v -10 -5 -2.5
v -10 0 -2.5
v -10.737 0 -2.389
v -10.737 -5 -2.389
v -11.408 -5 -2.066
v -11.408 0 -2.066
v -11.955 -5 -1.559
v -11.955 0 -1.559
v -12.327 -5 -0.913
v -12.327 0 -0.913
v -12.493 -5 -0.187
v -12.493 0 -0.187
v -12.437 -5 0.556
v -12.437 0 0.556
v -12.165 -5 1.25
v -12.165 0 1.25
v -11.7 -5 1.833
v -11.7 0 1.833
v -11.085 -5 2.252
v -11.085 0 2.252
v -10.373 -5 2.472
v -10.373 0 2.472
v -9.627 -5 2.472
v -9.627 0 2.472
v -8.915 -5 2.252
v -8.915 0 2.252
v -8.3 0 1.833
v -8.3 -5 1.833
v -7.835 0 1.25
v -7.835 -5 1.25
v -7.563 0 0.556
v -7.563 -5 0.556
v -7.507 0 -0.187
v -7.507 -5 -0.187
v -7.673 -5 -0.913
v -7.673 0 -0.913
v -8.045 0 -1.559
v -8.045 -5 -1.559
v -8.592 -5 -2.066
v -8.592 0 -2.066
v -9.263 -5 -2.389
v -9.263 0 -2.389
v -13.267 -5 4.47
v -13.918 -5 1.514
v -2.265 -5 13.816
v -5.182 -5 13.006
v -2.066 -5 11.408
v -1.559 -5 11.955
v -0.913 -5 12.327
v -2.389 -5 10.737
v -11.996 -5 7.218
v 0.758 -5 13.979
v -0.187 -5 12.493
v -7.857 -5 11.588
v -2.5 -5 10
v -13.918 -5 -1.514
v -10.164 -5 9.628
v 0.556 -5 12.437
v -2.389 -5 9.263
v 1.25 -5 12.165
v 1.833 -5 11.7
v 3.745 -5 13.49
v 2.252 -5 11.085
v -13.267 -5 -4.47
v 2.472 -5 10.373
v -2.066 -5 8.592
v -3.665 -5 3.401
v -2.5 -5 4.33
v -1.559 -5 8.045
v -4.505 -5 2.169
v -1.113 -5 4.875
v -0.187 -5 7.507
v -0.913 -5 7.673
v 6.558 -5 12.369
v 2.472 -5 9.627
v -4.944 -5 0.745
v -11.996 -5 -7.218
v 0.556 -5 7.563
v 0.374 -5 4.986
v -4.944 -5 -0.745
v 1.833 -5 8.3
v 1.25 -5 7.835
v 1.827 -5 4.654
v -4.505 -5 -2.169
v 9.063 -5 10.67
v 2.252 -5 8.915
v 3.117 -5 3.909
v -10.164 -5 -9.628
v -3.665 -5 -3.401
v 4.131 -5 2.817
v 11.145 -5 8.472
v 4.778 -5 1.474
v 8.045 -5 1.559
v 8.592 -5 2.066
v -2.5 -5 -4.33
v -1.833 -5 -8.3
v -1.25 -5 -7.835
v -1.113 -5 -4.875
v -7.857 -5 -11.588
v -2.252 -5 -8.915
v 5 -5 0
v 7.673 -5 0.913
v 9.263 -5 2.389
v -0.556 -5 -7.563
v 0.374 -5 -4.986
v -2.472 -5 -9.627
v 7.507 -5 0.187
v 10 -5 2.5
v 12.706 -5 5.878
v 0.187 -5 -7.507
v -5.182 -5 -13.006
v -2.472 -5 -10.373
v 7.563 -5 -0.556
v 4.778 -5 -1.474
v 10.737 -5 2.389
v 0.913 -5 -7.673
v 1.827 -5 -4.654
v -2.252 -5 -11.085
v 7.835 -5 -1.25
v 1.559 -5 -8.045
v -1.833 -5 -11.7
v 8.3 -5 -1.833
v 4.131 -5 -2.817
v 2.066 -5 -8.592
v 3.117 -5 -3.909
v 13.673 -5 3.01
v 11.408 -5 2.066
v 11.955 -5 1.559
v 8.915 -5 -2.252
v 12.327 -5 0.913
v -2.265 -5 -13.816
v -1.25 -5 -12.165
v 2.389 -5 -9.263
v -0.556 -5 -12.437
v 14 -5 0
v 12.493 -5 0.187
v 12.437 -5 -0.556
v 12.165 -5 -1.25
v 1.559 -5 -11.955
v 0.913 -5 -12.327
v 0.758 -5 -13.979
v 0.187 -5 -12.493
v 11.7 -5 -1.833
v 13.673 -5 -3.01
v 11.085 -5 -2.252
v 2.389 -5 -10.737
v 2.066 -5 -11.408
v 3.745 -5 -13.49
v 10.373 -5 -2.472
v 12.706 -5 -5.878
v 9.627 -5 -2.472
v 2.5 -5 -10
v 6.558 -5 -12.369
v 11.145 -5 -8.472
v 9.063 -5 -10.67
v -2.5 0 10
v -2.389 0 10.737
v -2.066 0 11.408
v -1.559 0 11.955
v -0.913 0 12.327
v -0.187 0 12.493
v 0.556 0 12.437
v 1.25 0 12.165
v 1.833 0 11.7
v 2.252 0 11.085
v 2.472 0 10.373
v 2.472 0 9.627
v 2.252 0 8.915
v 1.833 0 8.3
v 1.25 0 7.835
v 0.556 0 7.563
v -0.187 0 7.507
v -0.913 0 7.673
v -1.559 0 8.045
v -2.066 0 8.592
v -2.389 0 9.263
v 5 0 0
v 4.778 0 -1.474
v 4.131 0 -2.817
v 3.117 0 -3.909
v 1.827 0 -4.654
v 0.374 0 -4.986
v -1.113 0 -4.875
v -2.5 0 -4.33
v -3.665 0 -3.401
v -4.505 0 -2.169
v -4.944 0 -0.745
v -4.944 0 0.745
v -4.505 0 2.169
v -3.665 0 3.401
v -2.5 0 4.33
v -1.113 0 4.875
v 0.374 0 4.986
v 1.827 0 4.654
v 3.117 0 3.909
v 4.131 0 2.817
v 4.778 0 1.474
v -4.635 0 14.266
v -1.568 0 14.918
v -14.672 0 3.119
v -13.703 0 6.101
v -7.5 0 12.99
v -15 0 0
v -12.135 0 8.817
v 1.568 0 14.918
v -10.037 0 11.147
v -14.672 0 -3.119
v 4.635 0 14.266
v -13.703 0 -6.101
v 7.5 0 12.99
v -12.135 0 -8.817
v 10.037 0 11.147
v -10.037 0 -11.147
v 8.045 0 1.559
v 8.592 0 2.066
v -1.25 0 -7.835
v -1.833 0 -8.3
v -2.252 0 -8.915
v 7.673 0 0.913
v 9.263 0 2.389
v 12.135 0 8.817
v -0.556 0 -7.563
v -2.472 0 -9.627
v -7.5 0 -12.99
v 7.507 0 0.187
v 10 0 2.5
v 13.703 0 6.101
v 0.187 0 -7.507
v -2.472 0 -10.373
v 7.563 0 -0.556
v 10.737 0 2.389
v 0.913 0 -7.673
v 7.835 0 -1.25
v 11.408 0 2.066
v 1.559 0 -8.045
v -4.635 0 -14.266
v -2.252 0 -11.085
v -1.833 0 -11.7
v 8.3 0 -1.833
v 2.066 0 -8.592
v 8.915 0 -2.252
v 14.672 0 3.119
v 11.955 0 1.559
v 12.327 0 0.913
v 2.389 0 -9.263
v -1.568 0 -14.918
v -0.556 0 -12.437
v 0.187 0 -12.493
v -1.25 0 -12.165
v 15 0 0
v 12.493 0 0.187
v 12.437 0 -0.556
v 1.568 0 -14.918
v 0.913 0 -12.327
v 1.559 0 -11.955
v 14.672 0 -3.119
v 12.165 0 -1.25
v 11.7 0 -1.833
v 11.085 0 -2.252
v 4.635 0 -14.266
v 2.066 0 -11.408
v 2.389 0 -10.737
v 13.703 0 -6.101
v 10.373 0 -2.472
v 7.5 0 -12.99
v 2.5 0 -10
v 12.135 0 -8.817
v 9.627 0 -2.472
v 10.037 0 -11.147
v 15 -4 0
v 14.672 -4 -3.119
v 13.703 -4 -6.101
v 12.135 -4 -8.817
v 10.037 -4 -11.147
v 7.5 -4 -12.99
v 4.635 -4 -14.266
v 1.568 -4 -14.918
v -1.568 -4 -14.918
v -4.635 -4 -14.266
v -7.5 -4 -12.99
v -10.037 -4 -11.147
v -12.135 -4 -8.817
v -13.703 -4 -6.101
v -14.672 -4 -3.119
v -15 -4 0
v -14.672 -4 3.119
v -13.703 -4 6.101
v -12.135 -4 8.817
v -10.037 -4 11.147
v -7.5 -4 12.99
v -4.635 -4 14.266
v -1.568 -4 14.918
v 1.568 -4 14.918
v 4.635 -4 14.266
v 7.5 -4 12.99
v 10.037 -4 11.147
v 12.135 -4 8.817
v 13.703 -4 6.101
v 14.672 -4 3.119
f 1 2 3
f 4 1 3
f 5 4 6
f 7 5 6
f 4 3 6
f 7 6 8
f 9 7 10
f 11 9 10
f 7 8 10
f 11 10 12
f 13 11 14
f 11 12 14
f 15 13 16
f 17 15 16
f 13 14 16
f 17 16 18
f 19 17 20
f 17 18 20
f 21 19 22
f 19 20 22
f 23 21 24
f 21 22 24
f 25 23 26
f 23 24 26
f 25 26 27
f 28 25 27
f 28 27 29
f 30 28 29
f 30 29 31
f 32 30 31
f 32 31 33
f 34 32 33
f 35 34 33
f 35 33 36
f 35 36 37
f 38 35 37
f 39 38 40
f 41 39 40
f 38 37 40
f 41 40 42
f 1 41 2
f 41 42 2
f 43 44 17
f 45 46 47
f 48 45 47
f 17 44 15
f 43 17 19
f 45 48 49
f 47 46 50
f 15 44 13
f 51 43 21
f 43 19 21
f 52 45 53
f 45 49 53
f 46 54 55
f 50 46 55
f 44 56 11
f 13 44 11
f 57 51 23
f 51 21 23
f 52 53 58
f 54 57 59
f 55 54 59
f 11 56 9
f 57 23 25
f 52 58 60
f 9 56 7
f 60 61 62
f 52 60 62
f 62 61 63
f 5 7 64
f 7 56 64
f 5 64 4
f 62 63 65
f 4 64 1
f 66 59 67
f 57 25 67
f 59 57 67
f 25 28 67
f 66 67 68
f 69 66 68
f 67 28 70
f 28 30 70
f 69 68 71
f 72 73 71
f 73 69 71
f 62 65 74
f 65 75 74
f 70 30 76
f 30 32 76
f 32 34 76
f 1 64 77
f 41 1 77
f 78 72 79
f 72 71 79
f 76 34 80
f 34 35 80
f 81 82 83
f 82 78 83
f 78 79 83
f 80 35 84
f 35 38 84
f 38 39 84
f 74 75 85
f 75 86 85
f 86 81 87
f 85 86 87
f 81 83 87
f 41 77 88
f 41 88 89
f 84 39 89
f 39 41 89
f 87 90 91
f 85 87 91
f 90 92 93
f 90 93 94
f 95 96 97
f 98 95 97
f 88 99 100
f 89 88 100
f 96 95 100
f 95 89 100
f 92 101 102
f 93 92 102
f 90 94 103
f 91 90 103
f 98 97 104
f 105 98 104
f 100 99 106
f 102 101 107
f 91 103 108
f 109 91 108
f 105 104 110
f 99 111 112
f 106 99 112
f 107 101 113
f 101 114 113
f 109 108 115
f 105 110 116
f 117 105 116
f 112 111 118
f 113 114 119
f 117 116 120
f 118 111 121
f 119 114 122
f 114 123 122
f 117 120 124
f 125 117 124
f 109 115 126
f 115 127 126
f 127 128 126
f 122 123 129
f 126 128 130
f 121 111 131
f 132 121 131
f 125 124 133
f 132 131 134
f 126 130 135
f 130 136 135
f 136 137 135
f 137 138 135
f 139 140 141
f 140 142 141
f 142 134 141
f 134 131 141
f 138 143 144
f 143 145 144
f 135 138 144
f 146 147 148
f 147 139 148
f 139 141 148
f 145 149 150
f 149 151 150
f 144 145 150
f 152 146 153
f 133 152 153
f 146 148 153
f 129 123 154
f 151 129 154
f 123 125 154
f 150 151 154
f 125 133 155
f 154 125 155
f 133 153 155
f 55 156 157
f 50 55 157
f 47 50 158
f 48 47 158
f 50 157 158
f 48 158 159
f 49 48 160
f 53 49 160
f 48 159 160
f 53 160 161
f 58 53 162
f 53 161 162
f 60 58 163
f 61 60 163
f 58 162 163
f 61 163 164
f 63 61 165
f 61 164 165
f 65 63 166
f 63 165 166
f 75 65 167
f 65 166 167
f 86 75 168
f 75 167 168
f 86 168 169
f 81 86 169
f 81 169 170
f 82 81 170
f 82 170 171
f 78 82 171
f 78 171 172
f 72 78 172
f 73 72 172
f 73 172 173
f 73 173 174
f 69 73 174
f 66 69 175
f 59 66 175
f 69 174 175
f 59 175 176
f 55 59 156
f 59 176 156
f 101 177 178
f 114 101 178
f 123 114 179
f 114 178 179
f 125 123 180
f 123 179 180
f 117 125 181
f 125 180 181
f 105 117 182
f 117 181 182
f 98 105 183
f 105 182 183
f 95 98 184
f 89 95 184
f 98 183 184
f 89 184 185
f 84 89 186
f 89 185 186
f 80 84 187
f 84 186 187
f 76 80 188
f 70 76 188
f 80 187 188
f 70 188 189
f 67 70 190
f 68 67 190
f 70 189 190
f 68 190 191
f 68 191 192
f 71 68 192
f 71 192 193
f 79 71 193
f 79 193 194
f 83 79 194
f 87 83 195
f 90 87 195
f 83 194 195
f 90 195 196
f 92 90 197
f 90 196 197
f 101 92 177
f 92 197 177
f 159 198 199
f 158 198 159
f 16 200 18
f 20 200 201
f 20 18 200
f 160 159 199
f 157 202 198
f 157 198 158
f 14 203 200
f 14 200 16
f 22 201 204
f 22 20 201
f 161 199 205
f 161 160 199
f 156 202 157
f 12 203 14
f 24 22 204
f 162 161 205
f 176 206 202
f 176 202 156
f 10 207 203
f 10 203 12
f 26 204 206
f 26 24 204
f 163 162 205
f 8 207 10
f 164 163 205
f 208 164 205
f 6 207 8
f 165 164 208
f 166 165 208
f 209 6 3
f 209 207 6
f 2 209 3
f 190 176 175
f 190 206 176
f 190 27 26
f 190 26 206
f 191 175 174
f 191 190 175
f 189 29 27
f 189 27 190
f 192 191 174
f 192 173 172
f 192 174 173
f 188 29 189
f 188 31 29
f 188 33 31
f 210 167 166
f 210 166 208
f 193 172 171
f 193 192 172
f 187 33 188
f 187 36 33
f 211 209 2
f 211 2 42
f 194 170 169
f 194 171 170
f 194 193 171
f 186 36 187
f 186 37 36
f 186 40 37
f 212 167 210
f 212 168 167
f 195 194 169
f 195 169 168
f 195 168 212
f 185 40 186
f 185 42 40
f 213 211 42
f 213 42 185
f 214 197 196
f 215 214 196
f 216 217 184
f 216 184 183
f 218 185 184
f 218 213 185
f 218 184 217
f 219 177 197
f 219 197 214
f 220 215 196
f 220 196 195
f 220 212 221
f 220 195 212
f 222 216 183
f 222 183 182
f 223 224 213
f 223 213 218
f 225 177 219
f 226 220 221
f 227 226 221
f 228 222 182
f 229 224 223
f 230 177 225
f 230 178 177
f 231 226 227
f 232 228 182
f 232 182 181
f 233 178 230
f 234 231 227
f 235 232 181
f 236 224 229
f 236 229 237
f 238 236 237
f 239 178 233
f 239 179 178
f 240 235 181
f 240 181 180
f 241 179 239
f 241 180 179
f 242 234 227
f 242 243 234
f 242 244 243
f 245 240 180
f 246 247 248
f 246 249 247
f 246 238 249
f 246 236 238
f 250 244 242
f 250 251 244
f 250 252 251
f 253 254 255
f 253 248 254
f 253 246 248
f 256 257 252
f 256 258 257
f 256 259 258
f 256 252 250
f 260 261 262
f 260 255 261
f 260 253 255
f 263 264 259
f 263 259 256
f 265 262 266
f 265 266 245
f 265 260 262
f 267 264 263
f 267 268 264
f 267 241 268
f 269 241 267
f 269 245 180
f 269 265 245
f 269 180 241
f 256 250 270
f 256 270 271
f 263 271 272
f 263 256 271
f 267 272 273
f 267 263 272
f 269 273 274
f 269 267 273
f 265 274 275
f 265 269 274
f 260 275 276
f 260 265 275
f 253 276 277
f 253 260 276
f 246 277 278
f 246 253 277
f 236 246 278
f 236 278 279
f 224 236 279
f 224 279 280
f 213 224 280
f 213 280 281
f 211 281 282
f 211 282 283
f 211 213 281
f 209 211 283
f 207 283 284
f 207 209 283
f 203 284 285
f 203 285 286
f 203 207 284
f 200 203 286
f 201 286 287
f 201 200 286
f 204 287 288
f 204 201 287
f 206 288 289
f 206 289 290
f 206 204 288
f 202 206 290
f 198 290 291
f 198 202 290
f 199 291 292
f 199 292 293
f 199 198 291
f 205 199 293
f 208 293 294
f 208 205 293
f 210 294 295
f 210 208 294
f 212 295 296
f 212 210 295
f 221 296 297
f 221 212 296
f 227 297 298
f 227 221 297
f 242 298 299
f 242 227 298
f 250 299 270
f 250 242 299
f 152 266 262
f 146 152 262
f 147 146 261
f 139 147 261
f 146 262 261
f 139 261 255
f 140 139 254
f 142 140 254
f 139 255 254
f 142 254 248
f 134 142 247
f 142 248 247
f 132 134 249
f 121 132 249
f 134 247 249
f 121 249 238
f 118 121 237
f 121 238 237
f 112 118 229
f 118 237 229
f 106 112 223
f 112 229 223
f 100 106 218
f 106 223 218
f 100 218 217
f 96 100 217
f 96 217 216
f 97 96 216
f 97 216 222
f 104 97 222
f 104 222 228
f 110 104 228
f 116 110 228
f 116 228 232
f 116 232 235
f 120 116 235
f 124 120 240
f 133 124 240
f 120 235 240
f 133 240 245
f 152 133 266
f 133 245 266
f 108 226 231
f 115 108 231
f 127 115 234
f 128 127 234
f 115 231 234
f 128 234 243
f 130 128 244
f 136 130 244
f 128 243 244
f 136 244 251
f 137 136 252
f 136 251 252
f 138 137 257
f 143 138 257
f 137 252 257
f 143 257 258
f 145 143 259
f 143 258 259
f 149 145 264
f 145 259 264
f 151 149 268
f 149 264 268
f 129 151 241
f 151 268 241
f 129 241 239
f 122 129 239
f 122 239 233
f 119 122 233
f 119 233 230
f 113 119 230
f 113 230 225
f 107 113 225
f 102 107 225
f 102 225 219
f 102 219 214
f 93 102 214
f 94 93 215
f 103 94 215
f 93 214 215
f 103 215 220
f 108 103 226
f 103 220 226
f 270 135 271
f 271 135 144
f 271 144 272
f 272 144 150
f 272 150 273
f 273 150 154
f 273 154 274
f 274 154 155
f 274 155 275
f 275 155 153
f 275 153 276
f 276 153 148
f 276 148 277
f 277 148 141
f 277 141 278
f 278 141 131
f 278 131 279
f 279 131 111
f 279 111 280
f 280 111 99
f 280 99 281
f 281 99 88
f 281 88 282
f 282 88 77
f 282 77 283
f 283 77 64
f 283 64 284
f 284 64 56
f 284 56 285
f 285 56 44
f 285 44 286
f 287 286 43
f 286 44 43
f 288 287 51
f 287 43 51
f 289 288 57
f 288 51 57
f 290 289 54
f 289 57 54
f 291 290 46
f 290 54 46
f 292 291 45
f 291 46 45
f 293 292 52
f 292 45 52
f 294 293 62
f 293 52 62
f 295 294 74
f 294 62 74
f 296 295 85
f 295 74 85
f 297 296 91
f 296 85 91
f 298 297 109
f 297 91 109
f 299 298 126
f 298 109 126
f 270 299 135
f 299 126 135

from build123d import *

# Parameters (mm, degrees)
SKETCH1_R           = 15
SKETCH1_R_2         = 5
BOSS_EXTRUDE1_DEPTH = 5
SKETCH1_3_R         = 2.5
CUT_EXTRUDE1_DEPTH  = 5
CIRPATTERN1_COUNT   = 4
CHAMFER1_SIZE       = 1


with BuildPart() as part:
    # Sketch1 → Boss-Extrude1 (new body)
    with BuildSketch(Plane(origin=(0, 0, 0), x_dir=(1, 0, 0), z_dir=(0, 1, 0))):
        Circle(SKETCH1_R)
        Circle(SKETCH1_R_2, mode=Mode.SUBTRACT)
    extrude(amount=-BOSS_EXTRUDE1_DEPTH)

    # Sketch1<3> → Cut-Extrude1 (cut)
    with BuildSketch(Plane(origin=(0, 0, 0), x_dir=(1, 0, 0), z_dir=(0, 1, 0))):
        with Locations((0, 10)):
            Circle(SKETCH1_3_R)
    cut_extrude1 = extrude(amount=-CUT_EXTRUDE1_DEPTH, mode=Mode.SUBTRACT)

    # CirPattern1: Cut-Extrude1 ×4 about axis
    cirpattern1_axis = Axis((0, -5, 0), (0, 1, 0))
    for i in range(1, CIRPATTERN1_COUNT):
        add(cut_extrude1.rotate(cirpattern1_axis, i * 360 / CIRPATTERN1_COUNT), mode=Mode.SUBTRACT)

    # Chamfer1
    chamfer1_edges = [part.edges().sort_by_distance(p)[0] for p in [
        (-15, -5, 0),
    ]]
    chamfer(chamfer1_edges, length=CHAMFER1_SIZE)


solid = part.part
